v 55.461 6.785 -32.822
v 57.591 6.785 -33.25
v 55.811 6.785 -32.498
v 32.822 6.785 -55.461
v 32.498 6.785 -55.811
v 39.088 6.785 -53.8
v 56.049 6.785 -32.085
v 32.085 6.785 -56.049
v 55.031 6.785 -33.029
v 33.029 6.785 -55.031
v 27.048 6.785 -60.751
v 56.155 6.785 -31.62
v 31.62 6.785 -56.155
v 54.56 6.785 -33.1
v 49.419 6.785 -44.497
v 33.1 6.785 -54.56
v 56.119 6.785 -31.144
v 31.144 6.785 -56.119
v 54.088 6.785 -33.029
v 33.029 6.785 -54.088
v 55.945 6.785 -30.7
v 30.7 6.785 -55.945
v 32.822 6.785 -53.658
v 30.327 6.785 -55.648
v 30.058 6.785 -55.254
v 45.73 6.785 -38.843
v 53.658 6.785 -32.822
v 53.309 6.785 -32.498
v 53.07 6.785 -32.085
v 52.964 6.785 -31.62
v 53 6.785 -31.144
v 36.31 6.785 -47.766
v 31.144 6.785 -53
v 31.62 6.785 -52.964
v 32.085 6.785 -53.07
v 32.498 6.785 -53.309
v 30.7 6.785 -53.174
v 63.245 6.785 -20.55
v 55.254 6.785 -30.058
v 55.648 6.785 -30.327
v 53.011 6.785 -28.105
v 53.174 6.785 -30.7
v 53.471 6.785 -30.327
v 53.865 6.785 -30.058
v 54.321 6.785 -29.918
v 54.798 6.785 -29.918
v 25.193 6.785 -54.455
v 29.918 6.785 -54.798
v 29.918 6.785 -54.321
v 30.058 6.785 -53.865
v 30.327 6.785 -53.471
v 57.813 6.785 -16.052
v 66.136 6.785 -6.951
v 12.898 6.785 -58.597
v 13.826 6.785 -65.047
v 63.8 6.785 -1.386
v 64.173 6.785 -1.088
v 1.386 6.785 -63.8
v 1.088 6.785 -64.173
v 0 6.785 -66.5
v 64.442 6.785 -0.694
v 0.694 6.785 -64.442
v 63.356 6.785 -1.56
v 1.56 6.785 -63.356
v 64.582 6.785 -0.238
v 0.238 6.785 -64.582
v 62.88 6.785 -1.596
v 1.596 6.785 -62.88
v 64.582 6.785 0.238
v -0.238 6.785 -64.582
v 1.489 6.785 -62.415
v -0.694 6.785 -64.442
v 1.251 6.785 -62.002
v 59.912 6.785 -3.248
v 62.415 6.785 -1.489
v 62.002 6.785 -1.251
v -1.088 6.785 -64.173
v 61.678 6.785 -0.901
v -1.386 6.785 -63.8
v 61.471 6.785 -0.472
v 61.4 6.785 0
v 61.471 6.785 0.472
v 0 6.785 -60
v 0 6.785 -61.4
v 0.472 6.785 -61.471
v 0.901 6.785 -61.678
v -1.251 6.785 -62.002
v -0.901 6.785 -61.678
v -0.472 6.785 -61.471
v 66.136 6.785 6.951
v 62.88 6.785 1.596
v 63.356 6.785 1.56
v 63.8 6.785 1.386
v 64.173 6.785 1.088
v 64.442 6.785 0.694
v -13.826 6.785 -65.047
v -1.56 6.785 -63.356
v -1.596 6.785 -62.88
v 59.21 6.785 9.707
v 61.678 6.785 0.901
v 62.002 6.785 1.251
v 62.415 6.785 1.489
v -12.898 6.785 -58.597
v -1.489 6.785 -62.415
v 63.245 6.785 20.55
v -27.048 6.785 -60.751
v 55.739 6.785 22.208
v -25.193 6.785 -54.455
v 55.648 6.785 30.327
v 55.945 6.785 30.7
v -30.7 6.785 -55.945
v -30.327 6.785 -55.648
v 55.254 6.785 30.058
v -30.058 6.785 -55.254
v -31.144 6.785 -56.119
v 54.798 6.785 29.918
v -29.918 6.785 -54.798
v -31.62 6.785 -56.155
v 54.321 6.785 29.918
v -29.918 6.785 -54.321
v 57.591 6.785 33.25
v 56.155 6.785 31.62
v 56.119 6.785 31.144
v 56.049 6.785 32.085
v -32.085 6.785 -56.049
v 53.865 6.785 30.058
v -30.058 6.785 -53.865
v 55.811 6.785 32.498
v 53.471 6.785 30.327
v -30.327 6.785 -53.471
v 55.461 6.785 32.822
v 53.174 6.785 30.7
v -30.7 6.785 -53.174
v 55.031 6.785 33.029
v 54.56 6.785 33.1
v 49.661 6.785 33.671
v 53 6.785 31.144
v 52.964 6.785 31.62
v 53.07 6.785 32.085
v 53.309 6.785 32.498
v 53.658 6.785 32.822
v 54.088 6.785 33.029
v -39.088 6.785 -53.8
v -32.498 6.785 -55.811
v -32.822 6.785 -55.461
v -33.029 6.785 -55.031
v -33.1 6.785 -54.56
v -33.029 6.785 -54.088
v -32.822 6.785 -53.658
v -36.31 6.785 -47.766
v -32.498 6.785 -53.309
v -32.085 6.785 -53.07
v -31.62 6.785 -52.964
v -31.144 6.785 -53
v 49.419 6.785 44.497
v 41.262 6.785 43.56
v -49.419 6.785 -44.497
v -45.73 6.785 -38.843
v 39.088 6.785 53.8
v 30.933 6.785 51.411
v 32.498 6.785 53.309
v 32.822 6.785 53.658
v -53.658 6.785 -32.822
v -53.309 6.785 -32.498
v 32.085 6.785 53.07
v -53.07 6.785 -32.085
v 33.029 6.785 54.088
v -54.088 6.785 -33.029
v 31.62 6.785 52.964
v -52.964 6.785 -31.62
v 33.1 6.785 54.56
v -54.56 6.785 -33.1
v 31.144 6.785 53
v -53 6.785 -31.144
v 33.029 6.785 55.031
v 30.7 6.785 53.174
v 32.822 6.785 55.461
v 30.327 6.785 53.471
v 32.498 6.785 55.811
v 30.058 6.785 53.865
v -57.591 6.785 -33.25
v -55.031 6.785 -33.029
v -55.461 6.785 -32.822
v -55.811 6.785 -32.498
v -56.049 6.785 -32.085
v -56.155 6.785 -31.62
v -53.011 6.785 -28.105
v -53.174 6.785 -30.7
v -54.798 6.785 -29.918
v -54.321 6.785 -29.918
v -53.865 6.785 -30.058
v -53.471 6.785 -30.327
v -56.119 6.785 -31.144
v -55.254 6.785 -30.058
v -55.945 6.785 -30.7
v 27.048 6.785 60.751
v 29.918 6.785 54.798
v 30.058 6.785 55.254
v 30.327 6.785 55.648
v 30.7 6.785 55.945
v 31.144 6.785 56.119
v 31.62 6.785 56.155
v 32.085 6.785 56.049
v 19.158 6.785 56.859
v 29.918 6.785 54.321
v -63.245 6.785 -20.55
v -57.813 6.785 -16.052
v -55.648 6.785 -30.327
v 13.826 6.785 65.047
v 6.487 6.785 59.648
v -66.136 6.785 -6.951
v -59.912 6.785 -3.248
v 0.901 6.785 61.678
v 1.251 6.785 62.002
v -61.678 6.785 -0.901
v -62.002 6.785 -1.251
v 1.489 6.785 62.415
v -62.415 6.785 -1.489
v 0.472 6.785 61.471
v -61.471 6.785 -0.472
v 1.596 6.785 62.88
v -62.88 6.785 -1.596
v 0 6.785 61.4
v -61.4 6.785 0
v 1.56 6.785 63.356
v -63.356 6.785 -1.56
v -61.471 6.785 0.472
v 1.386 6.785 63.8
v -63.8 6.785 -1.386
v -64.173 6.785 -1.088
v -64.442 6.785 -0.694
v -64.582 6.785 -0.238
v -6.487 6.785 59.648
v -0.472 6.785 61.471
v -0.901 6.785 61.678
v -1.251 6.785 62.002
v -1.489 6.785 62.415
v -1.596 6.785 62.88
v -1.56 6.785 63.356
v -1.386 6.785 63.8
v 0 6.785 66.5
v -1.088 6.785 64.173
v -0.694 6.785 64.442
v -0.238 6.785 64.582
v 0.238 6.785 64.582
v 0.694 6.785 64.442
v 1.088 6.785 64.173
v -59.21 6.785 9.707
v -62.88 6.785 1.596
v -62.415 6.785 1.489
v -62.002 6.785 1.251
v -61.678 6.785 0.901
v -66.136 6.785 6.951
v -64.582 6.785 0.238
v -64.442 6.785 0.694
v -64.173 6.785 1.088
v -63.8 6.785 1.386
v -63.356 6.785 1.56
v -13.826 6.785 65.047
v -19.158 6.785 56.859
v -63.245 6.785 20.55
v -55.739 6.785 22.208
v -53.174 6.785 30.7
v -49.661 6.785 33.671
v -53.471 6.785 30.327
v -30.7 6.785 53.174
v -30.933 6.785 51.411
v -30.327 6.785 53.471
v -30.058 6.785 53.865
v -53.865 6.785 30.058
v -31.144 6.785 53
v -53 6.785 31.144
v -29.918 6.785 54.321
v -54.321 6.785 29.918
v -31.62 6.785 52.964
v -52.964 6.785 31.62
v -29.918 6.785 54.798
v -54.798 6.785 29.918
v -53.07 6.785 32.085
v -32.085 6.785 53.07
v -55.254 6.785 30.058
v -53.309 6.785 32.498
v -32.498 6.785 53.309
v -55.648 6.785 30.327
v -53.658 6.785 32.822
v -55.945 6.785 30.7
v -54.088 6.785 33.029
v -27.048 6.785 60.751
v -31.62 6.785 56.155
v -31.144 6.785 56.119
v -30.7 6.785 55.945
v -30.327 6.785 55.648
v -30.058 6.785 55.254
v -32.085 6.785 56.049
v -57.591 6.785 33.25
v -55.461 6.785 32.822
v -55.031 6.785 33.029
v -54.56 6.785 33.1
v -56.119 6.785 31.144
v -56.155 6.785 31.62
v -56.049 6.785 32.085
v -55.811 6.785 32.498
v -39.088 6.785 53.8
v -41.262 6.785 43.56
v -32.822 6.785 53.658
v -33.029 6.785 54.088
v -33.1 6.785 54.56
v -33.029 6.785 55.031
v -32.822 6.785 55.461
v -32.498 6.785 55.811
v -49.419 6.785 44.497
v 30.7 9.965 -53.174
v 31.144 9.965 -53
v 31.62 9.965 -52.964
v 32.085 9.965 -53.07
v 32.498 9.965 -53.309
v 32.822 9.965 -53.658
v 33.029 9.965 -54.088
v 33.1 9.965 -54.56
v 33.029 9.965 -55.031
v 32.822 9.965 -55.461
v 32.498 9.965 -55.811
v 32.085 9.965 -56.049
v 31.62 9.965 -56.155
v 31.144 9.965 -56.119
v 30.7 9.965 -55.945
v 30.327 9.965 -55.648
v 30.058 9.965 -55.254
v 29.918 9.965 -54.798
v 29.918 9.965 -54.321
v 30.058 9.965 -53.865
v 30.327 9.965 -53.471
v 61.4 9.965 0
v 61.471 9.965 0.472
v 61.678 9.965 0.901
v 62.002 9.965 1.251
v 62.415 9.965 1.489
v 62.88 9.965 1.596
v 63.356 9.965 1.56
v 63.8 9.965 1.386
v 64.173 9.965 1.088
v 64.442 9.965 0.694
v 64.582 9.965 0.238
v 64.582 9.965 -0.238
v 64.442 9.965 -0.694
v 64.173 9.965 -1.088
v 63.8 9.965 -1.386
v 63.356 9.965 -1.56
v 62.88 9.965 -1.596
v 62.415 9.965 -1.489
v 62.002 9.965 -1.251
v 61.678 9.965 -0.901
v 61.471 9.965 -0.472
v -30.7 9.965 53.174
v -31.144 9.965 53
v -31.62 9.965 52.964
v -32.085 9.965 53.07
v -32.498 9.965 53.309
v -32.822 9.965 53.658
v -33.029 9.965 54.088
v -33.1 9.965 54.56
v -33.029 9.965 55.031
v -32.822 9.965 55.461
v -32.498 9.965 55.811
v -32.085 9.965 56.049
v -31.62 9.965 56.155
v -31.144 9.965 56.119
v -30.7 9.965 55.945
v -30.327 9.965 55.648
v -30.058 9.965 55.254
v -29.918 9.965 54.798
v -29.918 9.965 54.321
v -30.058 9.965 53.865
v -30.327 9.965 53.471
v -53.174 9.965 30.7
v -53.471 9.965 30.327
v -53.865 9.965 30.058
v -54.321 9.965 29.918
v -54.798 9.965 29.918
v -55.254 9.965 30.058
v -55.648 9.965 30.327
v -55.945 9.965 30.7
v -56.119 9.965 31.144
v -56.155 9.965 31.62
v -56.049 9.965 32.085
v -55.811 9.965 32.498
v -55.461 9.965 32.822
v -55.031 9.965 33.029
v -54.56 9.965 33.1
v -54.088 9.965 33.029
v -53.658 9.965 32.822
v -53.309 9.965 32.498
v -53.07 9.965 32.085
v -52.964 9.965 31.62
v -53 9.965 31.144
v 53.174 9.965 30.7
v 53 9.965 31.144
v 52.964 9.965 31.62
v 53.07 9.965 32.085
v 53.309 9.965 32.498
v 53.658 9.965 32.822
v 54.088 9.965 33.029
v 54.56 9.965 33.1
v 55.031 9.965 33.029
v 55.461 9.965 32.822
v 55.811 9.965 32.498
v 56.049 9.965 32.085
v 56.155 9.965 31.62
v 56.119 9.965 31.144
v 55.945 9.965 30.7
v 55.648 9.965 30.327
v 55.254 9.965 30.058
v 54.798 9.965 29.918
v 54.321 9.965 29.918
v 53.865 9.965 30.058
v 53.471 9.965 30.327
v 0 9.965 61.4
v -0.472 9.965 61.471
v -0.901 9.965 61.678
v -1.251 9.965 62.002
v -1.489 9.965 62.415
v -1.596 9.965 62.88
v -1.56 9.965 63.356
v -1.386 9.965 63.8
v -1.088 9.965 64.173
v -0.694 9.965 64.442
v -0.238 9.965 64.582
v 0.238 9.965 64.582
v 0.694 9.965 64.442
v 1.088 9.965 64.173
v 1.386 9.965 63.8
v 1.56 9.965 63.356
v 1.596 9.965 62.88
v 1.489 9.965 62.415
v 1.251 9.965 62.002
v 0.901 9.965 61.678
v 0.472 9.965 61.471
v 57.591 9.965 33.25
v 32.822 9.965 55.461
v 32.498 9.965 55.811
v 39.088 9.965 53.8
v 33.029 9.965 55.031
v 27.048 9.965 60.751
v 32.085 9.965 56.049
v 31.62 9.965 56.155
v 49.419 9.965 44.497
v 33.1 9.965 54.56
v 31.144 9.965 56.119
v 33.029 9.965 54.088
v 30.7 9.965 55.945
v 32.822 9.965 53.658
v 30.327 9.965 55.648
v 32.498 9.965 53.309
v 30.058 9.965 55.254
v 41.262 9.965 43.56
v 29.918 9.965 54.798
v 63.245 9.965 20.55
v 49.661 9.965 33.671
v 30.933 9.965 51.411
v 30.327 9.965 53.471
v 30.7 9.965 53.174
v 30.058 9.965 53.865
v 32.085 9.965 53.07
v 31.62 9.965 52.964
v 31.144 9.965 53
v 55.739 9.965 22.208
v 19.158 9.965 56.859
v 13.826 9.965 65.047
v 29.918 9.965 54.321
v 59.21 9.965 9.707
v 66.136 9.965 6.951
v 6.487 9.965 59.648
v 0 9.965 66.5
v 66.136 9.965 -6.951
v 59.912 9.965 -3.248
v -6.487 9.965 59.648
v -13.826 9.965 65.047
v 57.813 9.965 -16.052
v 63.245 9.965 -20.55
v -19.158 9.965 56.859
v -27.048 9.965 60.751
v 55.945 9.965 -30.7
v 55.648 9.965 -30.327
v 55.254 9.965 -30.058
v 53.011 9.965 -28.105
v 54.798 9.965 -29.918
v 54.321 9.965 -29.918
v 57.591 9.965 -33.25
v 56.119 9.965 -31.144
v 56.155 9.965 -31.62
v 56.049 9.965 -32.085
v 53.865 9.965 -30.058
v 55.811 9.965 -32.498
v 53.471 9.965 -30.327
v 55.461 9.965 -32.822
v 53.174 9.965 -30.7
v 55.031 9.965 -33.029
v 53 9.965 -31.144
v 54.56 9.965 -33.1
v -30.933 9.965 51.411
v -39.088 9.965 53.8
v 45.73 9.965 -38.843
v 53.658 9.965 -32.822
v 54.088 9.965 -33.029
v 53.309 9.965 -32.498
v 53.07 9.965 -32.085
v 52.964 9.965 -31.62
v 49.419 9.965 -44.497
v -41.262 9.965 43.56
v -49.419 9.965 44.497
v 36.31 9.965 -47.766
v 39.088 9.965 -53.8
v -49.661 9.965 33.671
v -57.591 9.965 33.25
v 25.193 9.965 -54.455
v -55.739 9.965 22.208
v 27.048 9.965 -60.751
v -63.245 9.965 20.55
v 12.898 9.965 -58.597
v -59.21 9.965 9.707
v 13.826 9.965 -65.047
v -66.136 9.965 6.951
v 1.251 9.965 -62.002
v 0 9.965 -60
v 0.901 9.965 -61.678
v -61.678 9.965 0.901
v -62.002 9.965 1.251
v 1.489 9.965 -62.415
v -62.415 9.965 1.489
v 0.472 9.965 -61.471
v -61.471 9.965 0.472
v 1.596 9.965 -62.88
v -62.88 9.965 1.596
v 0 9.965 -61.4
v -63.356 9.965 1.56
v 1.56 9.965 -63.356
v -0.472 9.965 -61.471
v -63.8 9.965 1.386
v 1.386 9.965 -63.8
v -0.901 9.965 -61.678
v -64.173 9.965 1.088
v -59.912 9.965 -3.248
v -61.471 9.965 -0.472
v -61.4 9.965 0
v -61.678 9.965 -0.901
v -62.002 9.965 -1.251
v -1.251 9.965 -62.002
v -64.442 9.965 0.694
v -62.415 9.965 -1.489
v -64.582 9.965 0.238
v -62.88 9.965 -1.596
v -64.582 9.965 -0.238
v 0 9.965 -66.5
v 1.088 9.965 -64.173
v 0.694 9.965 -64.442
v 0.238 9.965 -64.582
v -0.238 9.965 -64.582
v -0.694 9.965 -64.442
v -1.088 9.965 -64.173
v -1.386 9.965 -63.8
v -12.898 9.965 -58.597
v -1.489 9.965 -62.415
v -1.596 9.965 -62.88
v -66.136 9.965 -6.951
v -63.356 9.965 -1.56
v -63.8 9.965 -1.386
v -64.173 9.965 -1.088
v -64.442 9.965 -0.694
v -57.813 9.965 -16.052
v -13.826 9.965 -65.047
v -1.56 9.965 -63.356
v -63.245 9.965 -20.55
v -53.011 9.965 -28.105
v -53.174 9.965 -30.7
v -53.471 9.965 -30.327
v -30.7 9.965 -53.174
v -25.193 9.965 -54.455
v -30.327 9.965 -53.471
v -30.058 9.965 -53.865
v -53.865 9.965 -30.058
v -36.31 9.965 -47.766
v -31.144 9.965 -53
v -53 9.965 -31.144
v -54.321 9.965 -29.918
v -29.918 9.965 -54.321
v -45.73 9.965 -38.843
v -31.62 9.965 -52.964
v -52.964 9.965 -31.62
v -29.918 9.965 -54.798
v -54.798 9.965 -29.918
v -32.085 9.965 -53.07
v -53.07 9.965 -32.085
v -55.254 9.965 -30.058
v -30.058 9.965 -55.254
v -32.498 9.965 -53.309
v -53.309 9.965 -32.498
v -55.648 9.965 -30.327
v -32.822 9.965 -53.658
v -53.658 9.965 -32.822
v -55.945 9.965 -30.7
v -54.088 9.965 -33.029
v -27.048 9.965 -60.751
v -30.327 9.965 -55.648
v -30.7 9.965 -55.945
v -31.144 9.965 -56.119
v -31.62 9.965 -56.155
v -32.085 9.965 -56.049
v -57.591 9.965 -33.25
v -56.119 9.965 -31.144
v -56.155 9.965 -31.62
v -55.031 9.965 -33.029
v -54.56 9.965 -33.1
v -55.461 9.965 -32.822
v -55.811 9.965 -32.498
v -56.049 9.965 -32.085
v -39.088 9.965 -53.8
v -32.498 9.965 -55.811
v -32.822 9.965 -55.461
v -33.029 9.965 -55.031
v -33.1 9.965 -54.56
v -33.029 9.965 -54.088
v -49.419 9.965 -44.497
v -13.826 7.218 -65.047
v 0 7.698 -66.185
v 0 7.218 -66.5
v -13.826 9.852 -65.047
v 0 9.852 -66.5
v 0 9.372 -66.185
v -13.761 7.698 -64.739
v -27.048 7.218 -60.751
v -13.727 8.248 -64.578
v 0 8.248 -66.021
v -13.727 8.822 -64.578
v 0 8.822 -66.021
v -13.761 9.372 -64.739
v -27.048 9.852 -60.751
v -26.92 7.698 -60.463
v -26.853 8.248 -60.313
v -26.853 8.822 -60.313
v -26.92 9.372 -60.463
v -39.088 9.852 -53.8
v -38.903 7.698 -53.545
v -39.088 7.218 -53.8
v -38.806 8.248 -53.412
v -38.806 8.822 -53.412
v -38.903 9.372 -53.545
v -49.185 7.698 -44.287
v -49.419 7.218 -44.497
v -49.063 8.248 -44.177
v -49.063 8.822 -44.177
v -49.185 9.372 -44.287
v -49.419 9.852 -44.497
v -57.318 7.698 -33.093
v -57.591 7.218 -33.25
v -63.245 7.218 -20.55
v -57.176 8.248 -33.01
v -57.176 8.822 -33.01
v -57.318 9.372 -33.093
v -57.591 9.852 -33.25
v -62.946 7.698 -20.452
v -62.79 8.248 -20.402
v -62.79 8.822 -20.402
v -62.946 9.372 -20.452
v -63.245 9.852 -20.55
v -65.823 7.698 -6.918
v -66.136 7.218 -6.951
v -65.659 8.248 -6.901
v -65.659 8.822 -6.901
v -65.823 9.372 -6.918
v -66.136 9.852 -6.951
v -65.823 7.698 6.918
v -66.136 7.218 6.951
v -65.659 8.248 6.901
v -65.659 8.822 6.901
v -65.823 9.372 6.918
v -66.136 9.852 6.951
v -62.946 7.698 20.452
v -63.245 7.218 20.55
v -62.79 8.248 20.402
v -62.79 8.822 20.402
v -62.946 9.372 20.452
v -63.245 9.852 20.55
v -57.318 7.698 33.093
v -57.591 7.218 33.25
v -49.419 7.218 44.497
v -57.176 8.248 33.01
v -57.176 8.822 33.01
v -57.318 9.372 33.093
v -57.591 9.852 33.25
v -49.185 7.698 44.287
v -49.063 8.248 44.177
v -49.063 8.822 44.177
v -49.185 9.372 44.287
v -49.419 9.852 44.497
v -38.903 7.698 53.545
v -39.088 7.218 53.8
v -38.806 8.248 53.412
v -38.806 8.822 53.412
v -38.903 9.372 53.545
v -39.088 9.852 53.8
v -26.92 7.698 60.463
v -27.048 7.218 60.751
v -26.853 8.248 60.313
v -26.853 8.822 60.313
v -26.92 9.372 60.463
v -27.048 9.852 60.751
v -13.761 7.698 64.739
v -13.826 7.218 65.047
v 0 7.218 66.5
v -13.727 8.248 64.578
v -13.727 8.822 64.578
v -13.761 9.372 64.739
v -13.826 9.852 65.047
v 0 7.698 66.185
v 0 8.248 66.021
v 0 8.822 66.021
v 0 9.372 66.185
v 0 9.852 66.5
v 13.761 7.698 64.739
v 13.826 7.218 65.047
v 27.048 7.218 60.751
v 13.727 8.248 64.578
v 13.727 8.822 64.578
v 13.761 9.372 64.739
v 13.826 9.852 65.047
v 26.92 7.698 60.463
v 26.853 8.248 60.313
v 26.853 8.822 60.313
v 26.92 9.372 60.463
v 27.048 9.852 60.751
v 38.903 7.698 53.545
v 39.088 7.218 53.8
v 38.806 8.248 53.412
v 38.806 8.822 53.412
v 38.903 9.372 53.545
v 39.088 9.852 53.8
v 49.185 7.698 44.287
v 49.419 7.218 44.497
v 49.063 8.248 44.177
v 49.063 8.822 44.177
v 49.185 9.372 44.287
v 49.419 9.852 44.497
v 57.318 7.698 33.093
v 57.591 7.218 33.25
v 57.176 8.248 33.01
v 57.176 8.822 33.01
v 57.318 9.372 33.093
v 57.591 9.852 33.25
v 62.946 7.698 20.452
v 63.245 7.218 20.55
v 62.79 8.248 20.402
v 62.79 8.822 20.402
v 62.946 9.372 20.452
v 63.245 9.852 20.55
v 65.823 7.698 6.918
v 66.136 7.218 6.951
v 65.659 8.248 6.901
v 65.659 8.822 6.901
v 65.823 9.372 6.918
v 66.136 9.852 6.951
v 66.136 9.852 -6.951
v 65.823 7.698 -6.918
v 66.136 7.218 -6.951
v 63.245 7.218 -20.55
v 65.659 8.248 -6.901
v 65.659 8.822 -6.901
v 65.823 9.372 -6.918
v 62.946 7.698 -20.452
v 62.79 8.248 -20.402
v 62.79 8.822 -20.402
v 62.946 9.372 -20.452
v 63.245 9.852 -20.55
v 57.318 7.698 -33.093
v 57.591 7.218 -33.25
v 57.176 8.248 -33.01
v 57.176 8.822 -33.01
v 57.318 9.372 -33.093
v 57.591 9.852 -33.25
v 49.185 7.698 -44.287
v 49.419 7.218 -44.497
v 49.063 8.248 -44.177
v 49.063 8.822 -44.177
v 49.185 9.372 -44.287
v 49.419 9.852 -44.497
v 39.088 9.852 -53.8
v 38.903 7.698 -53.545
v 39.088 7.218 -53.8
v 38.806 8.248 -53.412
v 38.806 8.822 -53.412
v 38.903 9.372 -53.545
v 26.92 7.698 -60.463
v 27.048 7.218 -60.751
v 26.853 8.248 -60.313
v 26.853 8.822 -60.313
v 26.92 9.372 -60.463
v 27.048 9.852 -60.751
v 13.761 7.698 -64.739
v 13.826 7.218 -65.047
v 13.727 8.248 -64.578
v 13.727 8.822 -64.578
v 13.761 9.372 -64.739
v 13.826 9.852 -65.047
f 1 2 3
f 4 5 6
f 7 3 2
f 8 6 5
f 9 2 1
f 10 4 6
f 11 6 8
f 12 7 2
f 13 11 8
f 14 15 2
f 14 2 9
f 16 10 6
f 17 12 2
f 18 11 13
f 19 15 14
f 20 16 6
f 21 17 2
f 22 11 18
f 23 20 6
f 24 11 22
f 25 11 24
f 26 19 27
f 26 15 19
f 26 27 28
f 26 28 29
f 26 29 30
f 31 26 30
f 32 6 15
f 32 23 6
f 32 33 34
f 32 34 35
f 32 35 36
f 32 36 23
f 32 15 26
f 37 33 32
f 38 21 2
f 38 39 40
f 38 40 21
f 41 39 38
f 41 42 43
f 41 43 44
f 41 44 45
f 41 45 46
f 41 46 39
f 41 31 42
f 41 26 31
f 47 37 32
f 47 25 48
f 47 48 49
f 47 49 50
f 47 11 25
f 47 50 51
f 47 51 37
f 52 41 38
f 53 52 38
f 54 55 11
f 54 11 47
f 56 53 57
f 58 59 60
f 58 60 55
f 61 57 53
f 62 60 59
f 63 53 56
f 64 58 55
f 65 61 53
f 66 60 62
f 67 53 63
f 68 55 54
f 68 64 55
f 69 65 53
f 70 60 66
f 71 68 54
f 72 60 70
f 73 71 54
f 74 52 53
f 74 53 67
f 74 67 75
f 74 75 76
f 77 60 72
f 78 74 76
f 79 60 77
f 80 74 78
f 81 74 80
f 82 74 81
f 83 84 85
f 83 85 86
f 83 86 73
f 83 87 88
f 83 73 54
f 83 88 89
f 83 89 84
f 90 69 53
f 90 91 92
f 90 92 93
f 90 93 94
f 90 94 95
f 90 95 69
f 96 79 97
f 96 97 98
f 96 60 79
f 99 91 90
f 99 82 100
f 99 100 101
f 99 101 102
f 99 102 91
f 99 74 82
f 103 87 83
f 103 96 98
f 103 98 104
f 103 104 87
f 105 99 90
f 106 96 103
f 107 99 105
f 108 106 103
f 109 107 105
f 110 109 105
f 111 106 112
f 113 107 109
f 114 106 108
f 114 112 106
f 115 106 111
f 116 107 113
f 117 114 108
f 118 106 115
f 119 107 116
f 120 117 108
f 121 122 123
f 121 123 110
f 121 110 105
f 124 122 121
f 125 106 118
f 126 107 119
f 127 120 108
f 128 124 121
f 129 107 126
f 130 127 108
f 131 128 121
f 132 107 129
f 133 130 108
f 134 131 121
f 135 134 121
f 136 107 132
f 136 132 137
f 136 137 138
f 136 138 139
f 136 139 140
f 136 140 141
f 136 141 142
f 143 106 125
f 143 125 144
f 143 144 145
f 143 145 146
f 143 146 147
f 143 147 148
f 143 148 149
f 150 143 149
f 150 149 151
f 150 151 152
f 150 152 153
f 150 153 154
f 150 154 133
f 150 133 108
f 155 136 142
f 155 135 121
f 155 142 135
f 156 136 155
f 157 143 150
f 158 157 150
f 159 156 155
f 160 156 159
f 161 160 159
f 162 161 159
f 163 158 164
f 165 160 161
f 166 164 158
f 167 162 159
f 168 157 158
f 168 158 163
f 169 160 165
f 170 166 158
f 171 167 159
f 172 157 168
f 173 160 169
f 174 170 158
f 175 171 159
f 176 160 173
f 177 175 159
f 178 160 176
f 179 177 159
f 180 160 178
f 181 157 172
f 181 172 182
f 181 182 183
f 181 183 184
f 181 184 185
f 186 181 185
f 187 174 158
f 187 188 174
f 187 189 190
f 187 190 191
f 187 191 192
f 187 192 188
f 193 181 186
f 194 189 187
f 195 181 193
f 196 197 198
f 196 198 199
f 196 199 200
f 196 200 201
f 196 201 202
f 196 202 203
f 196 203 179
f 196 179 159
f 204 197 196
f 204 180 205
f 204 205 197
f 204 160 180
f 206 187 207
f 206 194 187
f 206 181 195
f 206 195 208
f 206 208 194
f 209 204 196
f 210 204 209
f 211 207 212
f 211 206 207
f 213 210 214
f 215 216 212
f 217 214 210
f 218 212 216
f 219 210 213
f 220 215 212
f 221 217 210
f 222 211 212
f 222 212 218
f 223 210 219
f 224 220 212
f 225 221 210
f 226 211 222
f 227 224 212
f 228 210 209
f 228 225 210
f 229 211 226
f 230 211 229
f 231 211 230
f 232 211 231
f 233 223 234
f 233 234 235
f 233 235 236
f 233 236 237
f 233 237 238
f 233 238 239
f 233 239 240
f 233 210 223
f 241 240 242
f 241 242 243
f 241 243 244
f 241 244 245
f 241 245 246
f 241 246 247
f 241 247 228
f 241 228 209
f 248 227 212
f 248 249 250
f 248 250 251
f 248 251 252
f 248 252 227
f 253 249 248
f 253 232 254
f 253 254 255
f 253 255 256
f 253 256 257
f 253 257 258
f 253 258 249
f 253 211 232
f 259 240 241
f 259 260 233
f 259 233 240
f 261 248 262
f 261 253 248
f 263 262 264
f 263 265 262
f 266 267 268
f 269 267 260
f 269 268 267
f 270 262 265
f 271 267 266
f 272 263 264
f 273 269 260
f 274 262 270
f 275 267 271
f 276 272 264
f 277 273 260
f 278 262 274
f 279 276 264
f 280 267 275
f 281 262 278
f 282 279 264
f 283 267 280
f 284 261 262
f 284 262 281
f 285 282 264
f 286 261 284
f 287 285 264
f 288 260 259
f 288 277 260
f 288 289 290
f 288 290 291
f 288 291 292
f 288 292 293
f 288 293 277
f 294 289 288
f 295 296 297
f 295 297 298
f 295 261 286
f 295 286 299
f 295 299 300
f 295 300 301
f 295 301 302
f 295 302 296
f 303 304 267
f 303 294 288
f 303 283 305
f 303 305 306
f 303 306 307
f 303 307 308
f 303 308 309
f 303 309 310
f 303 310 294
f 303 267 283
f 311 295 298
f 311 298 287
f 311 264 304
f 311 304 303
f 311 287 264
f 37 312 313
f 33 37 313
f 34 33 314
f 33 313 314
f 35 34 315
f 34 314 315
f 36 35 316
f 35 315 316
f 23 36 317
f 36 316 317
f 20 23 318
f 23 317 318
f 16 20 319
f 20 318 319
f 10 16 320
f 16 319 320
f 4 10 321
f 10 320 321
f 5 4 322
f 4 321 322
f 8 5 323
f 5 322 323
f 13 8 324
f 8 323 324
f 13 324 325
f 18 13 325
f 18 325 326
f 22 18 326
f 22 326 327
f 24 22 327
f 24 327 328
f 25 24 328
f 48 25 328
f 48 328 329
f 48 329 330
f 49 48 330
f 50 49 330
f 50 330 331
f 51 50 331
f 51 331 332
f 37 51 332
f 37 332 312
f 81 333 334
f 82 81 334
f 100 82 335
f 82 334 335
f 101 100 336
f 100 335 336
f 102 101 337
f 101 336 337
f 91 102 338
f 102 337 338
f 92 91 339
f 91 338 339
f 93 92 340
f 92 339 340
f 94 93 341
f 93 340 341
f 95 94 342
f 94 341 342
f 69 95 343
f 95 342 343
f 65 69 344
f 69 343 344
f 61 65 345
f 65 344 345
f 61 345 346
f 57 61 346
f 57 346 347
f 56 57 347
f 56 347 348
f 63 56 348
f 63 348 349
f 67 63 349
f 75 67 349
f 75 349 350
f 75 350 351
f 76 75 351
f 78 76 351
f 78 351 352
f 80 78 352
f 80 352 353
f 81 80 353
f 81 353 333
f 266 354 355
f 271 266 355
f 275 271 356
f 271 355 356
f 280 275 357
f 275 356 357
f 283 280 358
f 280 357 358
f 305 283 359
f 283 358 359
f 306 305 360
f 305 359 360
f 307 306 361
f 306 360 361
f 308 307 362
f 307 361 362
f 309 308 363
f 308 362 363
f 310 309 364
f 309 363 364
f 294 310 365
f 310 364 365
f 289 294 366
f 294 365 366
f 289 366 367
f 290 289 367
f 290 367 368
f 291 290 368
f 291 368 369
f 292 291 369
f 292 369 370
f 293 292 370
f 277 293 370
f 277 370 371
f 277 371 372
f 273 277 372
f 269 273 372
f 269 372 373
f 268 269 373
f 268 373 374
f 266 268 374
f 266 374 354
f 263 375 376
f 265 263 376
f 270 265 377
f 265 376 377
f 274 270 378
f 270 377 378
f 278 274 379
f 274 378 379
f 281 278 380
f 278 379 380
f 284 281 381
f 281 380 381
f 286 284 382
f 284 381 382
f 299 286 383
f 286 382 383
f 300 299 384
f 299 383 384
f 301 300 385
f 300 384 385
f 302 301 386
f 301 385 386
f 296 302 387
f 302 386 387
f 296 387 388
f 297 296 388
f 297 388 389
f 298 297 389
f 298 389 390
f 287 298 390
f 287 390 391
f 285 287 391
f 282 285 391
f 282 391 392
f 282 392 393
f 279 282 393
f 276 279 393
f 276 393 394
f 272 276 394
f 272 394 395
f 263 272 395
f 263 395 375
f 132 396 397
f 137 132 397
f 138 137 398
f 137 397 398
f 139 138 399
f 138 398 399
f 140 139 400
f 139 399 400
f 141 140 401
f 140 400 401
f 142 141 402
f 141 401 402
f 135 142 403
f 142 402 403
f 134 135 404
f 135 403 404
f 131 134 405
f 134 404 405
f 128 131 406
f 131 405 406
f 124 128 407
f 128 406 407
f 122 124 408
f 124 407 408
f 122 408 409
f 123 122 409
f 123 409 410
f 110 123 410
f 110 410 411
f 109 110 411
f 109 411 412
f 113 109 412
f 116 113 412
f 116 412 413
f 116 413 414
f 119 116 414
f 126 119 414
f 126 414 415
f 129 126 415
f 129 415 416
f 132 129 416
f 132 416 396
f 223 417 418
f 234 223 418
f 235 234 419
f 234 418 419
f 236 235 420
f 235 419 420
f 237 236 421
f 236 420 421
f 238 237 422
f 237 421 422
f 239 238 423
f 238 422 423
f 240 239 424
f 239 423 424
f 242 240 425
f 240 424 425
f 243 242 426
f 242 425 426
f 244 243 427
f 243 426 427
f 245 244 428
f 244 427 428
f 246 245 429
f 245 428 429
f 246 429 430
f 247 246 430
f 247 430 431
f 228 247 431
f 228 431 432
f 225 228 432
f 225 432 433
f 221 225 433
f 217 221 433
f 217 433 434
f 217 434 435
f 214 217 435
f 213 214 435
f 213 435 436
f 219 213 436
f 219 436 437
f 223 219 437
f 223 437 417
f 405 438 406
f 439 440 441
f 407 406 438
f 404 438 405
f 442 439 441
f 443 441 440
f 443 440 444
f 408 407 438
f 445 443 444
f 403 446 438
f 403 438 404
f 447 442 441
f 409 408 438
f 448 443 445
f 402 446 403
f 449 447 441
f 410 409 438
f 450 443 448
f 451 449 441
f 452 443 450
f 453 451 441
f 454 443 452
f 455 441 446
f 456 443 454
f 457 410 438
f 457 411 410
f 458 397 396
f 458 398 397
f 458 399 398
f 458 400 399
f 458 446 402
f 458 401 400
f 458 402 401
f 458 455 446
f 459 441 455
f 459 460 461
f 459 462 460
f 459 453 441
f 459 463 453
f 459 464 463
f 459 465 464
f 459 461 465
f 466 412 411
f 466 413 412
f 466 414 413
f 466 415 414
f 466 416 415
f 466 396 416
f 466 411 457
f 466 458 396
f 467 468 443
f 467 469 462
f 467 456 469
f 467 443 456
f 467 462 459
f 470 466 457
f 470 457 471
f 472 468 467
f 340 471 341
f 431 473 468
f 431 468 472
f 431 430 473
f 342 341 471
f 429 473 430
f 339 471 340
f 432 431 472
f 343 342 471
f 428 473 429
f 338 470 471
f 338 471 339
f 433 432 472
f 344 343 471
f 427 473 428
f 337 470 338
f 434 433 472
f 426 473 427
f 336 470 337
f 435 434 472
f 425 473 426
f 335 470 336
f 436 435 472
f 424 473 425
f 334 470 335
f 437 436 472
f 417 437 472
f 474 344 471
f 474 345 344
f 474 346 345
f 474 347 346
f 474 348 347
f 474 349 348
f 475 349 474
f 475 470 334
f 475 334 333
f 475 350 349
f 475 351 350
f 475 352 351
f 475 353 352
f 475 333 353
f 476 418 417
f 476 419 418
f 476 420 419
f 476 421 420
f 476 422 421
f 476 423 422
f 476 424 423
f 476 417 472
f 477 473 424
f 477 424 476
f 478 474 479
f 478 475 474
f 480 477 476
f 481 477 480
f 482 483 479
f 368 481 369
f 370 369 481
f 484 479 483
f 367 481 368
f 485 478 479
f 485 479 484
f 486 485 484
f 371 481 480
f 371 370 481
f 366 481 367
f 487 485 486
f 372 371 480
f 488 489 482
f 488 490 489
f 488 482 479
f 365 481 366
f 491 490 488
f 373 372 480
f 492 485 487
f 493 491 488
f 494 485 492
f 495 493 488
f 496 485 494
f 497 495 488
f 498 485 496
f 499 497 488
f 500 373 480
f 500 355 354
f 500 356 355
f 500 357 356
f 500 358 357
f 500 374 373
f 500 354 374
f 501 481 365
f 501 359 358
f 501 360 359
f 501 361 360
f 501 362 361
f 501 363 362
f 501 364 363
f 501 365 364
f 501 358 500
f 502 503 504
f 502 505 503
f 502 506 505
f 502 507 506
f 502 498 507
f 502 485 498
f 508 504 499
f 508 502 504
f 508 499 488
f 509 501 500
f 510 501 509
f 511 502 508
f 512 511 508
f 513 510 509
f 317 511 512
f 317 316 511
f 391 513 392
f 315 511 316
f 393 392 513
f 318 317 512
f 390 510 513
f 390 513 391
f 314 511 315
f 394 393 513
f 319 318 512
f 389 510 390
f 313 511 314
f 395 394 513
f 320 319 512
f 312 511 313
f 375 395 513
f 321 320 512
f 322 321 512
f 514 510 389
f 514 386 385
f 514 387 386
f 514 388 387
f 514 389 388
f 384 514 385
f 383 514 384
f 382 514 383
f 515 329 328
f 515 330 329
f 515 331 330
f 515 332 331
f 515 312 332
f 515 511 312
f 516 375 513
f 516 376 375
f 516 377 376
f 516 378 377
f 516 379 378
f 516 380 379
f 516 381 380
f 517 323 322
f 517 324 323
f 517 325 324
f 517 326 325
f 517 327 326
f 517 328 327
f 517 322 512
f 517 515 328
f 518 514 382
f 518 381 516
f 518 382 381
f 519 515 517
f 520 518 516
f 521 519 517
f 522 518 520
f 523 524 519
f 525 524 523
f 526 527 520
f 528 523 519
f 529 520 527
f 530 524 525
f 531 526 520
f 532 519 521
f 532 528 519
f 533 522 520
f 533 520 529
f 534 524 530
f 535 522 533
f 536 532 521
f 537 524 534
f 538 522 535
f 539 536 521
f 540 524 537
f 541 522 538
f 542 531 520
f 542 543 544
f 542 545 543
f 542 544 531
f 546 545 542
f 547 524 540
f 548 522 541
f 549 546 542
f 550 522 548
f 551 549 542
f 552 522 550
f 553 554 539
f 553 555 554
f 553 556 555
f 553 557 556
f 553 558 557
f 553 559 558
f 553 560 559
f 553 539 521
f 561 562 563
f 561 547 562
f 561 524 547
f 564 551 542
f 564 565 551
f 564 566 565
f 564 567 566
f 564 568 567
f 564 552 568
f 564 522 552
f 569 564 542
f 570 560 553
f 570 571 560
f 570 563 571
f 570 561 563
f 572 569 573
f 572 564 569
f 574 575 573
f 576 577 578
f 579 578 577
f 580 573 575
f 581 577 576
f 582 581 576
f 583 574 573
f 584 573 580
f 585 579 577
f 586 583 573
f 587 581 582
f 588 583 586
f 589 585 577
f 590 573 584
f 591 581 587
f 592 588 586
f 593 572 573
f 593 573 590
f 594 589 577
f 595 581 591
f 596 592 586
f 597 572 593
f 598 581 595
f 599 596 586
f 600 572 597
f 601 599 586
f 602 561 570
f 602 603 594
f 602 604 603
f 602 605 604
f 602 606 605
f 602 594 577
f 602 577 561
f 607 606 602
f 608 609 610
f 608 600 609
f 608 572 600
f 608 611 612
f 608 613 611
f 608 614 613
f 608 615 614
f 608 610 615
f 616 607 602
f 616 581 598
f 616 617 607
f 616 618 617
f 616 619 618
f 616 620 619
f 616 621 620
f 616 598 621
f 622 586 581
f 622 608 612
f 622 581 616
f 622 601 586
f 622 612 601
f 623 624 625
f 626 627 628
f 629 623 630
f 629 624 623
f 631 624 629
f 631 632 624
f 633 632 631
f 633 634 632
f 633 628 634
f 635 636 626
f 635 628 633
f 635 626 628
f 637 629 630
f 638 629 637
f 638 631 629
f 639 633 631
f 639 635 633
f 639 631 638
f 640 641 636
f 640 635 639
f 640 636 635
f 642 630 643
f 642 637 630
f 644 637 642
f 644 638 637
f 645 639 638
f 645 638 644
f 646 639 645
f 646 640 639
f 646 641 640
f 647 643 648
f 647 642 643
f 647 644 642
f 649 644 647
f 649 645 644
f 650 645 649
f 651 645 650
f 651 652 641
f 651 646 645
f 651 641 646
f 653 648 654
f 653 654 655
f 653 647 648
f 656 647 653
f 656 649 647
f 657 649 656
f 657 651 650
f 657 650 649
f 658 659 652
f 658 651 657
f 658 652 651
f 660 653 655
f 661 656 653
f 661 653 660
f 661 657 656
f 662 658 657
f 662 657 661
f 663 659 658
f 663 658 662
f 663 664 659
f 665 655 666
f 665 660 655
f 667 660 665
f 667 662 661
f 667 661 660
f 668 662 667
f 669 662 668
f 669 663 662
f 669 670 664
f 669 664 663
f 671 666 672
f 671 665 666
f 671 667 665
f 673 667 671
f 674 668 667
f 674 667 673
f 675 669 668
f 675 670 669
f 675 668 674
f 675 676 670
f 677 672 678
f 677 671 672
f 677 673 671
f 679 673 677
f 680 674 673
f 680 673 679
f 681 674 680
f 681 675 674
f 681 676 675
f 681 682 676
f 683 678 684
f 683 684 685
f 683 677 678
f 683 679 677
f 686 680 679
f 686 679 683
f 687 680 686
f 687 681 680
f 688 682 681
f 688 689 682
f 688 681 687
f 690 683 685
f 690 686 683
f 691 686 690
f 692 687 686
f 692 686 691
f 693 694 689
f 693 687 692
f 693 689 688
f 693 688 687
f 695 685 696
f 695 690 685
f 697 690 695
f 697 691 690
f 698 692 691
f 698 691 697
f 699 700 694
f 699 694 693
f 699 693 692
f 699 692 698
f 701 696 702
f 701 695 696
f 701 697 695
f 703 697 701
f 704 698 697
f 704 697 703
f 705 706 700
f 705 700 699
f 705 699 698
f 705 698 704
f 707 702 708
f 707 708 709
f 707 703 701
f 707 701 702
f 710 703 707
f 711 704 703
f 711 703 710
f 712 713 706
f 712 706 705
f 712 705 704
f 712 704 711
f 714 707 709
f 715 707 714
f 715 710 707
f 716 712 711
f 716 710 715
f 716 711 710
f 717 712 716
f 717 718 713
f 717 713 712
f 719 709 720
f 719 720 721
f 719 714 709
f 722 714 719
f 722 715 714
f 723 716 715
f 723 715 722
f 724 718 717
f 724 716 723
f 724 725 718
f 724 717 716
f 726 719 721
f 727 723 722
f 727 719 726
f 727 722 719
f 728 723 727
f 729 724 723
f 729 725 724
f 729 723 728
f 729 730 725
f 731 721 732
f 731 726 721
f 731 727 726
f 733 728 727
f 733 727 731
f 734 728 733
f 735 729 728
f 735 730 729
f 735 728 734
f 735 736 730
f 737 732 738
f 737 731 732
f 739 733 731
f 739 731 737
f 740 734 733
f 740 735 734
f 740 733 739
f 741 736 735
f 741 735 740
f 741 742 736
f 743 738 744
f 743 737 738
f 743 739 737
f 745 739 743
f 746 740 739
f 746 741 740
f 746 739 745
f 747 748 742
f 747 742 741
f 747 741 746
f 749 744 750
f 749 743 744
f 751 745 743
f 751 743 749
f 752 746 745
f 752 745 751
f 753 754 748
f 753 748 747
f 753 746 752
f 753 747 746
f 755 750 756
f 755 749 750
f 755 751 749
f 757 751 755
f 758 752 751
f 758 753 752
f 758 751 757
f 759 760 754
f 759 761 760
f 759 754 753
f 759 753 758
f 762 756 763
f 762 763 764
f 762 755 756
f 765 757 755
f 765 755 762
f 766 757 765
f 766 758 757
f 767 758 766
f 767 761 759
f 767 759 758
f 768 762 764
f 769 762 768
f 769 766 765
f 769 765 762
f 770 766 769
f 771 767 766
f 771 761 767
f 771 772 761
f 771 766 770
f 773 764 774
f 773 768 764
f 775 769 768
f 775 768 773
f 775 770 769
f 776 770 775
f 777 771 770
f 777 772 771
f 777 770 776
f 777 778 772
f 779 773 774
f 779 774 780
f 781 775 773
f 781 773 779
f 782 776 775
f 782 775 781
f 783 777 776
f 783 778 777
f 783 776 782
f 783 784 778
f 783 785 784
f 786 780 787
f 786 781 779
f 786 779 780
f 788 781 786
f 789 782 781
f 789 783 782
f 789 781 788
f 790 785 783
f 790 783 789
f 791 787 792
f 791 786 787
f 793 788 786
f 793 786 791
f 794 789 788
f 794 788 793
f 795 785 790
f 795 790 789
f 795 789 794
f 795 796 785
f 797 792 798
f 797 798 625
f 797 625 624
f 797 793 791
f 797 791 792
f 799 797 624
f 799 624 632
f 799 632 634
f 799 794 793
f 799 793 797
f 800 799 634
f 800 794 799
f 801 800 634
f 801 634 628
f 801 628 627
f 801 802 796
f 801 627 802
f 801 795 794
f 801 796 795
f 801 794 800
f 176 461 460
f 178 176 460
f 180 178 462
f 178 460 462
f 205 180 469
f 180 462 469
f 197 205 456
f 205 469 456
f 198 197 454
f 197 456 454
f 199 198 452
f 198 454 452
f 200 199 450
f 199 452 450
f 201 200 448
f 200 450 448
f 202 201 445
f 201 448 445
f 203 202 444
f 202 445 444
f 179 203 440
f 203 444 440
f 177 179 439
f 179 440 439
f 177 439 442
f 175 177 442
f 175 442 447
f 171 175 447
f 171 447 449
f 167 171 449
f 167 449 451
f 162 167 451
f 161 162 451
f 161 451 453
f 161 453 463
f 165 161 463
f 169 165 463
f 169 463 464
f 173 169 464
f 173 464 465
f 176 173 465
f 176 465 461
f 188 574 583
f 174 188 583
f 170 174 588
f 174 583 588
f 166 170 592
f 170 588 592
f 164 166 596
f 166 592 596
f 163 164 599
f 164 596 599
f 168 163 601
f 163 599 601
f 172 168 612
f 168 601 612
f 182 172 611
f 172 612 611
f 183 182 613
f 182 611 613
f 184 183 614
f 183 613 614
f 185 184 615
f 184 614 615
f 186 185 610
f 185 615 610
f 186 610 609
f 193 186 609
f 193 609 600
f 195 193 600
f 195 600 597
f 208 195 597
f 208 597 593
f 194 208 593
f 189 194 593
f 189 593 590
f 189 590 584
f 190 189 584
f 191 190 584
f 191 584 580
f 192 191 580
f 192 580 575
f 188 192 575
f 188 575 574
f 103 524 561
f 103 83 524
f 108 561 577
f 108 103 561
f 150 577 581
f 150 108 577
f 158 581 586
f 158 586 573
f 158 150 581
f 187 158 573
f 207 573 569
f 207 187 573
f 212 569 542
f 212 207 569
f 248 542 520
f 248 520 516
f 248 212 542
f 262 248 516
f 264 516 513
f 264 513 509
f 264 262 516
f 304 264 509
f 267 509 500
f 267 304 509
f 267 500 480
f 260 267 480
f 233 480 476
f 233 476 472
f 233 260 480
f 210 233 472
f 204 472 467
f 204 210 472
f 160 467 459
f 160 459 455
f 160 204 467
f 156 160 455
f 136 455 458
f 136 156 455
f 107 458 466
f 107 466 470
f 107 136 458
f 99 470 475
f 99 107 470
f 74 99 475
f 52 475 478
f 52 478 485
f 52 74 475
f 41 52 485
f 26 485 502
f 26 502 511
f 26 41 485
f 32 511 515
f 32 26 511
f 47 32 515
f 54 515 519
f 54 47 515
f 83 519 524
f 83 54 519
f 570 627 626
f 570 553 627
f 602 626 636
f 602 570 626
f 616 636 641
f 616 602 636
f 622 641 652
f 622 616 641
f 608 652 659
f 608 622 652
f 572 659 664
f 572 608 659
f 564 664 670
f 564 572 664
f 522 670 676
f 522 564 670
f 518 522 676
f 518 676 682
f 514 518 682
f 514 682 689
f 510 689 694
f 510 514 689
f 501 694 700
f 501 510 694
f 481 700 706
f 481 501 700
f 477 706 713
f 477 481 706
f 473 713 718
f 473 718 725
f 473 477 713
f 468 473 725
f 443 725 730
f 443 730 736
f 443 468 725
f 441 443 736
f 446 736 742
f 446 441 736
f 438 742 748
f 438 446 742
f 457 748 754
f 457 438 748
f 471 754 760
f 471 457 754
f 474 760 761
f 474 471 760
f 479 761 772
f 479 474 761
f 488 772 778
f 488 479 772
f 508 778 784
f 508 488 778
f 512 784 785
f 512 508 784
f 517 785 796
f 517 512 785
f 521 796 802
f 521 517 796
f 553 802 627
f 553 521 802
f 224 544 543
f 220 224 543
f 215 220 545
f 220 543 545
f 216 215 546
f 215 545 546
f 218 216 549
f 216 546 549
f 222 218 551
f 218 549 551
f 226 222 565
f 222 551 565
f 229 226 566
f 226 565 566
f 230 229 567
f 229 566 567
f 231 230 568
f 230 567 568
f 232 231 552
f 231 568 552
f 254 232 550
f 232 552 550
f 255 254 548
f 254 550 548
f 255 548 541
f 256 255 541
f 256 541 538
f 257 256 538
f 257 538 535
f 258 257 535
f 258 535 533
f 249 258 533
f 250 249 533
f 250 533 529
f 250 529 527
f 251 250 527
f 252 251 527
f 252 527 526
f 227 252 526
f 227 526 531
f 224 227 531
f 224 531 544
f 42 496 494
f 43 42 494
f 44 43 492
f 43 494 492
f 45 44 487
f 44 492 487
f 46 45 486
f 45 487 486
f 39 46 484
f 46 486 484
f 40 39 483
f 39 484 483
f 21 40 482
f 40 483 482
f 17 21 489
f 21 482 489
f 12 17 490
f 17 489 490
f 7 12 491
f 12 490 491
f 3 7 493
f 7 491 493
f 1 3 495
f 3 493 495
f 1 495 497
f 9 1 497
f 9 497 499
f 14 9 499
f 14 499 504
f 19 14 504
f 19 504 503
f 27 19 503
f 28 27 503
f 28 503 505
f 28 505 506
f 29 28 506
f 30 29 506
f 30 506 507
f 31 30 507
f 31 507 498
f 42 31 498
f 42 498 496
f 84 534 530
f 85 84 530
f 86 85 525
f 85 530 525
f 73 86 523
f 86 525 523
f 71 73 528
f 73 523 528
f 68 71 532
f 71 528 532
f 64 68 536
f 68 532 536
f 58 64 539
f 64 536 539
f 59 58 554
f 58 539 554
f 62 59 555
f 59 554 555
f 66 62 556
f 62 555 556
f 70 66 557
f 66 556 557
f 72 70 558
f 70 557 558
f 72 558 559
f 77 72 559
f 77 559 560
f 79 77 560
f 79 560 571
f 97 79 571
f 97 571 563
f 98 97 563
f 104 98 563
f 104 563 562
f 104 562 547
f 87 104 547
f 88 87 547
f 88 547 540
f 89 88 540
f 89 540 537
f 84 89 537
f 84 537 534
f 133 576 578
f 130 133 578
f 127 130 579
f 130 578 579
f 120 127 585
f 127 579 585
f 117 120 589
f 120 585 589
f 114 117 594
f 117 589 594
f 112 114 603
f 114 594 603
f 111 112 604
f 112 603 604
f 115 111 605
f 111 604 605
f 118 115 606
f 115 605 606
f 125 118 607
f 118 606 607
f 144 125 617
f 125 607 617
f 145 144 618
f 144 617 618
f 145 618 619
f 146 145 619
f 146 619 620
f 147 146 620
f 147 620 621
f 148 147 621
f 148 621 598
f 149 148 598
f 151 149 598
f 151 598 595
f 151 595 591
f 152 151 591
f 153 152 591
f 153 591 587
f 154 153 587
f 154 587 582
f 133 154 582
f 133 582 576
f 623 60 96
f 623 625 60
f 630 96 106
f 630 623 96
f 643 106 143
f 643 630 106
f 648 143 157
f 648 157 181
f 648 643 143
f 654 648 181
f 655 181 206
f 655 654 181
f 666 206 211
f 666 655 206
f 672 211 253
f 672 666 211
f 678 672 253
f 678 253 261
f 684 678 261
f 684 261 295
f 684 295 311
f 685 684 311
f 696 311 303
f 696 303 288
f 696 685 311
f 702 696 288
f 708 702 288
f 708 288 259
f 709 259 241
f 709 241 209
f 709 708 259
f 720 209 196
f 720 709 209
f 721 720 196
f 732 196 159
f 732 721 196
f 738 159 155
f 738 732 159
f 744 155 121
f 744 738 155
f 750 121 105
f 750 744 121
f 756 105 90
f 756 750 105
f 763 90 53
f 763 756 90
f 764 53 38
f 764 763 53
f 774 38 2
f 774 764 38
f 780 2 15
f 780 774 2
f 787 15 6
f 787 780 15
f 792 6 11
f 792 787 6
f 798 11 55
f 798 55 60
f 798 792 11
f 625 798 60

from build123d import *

# Parameters (mm, degrees)
SKETCH3_R          = 1.6
CUT_EXTRUDE1_DEPTH = 95.098950047
CIRPATTERN1_COUNT  = 12


with BuildPart() as part:
    # Sketch1 → Revolve1 (revolve)
    with BuildSketch(Plane.XY, mode=Mode.PRIVATE) as revolve1_sk:
        with BuildLine():
            Line((-66.5, 9.851956719), (-66.5, 9.965))
            Line((-66.5, 9.965), (-60, 9.965))
            Line((-60, 9.965), (-60, 6.785))
            Line((-60, 6.785), (-66.5, 6.785))
            Line((-66.5, 6.785), (-66.5, 7.218043281))
            ThreePointArc((-66.5, 7.218043281), (-66, 8.535), (-66.5, 9.851956719))
        make_face()
    revolve(revolve1_sk.sketch.rotate(Axis((0, -200069.047495165, 0), (0, 1, 0)), 270), axis=Axis((0, -200069.047495165, 0), (0, 1, 0)))

    # Sketch3 → Cut-Extrude1 (cut, through all)
    with BuildSketch(Plane(origin=(0, 9.965, 0), x_dir=(1, 0, 0), z_dir=(0, 1, 0))):
        with Locations(Location((0, 63, 0), (0, 0, 270))):
            Circle(SKETCH3_R)
    cut_extrude1 = extrude(amount=-CUT_EXTRUDE1_DEPTH, mode=Mode.SUBTRACT)

    # CirPattern1: Cut-Extrude1 ×12 about axis
    cirpattern1_axis = Axis((0, 0, 0), (0, 1, 0))
    for i in range(1, CIRPATTERN1_COUNT):
        add(cut_extrude1.rotate(cirpattern1_axis, i * 360 / CIRPATTERN1_COUNT), mode=Mode.SUBTRACT)


solid = part.part
